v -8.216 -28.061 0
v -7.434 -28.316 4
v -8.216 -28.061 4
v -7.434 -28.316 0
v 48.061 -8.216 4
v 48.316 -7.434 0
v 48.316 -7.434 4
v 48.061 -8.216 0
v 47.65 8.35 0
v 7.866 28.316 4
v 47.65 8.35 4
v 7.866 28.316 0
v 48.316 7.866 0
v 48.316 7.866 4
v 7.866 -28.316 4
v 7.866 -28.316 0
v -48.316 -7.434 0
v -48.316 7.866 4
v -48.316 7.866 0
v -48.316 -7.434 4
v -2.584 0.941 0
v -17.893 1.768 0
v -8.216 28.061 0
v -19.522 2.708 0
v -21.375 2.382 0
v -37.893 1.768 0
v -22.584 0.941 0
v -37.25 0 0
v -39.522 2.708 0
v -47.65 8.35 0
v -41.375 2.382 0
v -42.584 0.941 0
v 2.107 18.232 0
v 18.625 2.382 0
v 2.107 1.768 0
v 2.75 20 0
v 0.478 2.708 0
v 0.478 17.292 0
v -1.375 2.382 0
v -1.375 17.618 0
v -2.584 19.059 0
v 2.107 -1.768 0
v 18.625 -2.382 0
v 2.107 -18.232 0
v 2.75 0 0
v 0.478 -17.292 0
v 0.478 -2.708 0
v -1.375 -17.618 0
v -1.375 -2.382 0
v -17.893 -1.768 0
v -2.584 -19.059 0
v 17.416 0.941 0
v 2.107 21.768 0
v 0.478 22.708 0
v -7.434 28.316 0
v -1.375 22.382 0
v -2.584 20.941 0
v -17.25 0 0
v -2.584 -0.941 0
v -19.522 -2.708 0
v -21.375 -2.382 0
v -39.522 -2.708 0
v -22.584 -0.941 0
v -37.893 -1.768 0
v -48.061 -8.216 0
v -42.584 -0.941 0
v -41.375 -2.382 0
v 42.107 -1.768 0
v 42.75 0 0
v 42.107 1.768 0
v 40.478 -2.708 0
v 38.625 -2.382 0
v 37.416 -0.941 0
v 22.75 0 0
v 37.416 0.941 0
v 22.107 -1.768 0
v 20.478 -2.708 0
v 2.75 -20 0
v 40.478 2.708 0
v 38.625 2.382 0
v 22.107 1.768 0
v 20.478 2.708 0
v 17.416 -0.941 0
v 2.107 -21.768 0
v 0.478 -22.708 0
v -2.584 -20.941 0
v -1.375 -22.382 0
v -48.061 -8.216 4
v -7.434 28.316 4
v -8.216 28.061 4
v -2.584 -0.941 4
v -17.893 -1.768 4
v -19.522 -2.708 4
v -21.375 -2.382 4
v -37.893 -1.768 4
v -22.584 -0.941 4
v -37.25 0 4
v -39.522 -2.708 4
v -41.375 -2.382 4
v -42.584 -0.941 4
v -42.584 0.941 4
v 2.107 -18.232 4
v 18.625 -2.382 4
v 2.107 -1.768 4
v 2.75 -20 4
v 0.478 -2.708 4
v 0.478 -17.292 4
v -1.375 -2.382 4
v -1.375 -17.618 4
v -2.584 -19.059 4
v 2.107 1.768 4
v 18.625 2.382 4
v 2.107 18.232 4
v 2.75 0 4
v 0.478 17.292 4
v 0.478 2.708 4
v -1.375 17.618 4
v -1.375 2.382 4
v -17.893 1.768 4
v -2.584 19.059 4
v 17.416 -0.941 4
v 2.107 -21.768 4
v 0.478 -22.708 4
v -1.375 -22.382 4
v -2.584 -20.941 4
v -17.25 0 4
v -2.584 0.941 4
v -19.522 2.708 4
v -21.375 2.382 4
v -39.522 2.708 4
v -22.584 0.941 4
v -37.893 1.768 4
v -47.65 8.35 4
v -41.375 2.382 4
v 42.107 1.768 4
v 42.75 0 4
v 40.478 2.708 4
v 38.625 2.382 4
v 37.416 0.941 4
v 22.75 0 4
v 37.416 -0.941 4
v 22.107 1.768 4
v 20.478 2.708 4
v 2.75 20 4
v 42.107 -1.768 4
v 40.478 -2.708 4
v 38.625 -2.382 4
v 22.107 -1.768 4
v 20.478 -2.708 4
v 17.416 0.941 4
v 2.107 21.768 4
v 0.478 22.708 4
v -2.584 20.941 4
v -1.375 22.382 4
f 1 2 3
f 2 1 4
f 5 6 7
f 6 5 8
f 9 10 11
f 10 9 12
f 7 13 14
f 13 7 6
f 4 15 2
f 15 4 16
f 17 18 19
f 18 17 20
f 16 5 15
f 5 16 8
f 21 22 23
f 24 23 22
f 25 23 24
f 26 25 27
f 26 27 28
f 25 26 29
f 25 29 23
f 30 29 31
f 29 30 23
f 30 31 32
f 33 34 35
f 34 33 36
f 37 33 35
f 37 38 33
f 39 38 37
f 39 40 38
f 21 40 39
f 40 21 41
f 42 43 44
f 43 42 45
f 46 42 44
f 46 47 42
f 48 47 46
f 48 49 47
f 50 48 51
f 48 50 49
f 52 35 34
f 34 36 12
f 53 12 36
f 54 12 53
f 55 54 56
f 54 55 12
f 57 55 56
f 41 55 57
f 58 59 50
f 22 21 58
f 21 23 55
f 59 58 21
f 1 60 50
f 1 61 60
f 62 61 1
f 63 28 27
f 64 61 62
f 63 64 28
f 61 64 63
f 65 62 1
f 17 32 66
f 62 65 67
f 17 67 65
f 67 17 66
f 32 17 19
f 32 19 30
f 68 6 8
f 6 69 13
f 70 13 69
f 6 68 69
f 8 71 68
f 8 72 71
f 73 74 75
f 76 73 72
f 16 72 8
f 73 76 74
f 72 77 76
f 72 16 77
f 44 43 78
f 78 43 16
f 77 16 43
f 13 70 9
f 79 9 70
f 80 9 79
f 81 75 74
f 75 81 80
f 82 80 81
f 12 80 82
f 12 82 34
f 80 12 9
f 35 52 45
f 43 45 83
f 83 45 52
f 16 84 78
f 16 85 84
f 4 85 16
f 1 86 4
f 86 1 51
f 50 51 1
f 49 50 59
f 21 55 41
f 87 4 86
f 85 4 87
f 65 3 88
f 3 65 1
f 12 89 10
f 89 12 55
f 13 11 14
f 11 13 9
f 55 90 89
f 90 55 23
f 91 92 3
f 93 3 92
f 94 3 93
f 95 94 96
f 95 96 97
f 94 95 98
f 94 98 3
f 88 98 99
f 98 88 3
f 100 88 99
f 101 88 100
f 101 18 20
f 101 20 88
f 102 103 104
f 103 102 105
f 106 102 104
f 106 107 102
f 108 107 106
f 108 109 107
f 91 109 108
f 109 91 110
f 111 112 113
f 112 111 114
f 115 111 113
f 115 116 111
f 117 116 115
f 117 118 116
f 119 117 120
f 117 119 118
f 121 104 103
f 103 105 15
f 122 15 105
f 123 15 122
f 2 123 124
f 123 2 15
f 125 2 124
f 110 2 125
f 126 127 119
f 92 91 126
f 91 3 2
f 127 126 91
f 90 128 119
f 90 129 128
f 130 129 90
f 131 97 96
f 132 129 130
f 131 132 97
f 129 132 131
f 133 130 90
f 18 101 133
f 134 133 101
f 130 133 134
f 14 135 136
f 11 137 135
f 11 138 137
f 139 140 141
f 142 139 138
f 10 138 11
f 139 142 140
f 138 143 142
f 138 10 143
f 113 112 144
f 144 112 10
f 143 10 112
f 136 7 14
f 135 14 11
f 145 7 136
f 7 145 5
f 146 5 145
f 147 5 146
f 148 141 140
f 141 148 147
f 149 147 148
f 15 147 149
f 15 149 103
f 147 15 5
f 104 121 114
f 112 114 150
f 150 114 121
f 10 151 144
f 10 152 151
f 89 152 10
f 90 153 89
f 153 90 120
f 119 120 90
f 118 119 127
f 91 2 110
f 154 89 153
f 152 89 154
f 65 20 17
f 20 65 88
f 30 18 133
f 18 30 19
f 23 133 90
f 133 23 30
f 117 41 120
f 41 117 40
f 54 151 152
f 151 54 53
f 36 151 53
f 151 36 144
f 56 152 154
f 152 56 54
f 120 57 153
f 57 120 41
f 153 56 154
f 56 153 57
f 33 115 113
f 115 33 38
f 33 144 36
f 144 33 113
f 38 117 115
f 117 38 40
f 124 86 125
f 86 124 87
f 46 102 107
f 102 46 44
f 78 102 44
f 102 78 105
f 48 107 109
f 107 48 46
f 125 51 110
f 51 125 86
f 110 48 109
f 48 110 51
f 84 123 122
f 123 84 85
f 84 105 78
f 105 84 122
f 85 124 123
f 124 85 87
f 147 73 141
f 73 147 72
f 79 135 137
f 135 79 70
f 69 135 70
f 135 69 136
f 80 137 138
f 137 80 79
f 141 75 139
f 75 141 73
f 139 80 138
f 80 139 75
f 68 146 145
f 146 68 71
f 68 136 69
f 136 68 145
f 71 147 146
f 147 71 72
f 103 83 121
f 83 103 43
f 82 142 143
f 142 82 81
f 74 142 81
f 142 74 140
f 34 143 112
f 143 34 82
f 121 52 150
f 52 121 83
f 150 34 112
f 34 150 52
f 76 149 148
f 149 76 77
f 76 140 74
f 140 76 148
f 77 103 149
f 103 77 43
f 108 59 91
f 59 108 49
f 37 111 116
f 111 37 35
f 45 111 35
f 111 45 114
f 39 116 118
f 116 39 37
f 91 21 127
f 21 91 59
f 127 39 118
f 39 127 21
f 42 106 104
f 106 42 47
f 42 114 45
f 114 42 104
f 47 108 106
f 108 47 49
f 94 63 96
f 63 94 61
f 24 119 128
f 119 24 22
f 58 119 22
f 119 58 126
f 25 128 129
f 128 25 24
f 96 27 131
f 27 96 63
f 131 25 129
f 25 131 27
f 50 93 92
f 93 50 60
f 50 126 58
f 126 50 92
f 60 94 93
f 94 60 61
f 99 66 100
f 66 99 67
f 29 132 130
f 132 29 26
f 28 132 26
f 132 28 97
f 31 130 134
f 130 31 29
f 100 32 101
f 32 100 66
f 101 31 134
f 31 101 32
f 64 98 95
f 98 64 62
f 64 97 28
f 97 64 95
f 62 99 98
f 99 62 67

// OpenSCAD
// rob@openpart.co.uk 20140202-23:00
// 7 hole cross joining plate for 20mm NOMINAL extrusion
// V-Slot & others

module roundedRect(size, radius)
{
	x = size[0];
	y = size[1];
	z = size[2];
	linear_extrude(height=z)
	hull()
	{
		// place 4 circles in the corners, with the given radius
		translate([(-x/2)+(radius/2), (-y/2)+(radius/2), 0])
		circle(r=radius);
		translate([(x/2)-(radius/2), (-y/2)+(radius/2), 0])
		circle(r=radius);
		translate([(-x/2)+(radius/2), (y/2)-(radius/2), 0])
		circle(r=radius);
		translate([(x/2)-(radius/2), (y/2)-(radius/2), 0])
		circle(r=radius);
	}
}

hole = 5.5 / 2;
plate_width1 = 56;
plate_width2 = 96;
plate_length = 16;
plate_thickness = 4;
extend_past_thickness = 2;
corner_radius = 0.7;
difference () {
hull () {
	translate([0, 0, 0])
		roundedRect ([plate_length, plate_width1, plate_thickness], corner_radius);
	rotate (90,0,0) {

	translate([0, 0, 0])
		roundedRect ([plate_length, plate_width2, plate_thickness], corner_radius);
}}

	translate([0,20,-1])
		cylinder(h = (extend_past_thickness+plate_thickness+2), r = hole);
	translate([0,-20,-1])
		cylinder(h = (extend_past_thickness+plate_thickness+2), r = hole);

	translate([40,0,-1])
		cylinder(h = (extend_past_thickness+plate_thickness+2), r = hole);
	translate([20,0,-1])
		cylinder(h = (extend_past_thickness+plate_thickness+2), r = hole);
	translate([0,0,-1])
		cylinder(h = (extend_past_thickness+plate_thickness+2), r = hole);
	translate([-20,0,-1])
		cylinder(h = (extend_past_thickness+plate_thickness+2), r = hole);
	translate([-40,0,-1])
		cylinder(h = (extend_past_thickness+plate_thickness+2), r = hole);

}
	
